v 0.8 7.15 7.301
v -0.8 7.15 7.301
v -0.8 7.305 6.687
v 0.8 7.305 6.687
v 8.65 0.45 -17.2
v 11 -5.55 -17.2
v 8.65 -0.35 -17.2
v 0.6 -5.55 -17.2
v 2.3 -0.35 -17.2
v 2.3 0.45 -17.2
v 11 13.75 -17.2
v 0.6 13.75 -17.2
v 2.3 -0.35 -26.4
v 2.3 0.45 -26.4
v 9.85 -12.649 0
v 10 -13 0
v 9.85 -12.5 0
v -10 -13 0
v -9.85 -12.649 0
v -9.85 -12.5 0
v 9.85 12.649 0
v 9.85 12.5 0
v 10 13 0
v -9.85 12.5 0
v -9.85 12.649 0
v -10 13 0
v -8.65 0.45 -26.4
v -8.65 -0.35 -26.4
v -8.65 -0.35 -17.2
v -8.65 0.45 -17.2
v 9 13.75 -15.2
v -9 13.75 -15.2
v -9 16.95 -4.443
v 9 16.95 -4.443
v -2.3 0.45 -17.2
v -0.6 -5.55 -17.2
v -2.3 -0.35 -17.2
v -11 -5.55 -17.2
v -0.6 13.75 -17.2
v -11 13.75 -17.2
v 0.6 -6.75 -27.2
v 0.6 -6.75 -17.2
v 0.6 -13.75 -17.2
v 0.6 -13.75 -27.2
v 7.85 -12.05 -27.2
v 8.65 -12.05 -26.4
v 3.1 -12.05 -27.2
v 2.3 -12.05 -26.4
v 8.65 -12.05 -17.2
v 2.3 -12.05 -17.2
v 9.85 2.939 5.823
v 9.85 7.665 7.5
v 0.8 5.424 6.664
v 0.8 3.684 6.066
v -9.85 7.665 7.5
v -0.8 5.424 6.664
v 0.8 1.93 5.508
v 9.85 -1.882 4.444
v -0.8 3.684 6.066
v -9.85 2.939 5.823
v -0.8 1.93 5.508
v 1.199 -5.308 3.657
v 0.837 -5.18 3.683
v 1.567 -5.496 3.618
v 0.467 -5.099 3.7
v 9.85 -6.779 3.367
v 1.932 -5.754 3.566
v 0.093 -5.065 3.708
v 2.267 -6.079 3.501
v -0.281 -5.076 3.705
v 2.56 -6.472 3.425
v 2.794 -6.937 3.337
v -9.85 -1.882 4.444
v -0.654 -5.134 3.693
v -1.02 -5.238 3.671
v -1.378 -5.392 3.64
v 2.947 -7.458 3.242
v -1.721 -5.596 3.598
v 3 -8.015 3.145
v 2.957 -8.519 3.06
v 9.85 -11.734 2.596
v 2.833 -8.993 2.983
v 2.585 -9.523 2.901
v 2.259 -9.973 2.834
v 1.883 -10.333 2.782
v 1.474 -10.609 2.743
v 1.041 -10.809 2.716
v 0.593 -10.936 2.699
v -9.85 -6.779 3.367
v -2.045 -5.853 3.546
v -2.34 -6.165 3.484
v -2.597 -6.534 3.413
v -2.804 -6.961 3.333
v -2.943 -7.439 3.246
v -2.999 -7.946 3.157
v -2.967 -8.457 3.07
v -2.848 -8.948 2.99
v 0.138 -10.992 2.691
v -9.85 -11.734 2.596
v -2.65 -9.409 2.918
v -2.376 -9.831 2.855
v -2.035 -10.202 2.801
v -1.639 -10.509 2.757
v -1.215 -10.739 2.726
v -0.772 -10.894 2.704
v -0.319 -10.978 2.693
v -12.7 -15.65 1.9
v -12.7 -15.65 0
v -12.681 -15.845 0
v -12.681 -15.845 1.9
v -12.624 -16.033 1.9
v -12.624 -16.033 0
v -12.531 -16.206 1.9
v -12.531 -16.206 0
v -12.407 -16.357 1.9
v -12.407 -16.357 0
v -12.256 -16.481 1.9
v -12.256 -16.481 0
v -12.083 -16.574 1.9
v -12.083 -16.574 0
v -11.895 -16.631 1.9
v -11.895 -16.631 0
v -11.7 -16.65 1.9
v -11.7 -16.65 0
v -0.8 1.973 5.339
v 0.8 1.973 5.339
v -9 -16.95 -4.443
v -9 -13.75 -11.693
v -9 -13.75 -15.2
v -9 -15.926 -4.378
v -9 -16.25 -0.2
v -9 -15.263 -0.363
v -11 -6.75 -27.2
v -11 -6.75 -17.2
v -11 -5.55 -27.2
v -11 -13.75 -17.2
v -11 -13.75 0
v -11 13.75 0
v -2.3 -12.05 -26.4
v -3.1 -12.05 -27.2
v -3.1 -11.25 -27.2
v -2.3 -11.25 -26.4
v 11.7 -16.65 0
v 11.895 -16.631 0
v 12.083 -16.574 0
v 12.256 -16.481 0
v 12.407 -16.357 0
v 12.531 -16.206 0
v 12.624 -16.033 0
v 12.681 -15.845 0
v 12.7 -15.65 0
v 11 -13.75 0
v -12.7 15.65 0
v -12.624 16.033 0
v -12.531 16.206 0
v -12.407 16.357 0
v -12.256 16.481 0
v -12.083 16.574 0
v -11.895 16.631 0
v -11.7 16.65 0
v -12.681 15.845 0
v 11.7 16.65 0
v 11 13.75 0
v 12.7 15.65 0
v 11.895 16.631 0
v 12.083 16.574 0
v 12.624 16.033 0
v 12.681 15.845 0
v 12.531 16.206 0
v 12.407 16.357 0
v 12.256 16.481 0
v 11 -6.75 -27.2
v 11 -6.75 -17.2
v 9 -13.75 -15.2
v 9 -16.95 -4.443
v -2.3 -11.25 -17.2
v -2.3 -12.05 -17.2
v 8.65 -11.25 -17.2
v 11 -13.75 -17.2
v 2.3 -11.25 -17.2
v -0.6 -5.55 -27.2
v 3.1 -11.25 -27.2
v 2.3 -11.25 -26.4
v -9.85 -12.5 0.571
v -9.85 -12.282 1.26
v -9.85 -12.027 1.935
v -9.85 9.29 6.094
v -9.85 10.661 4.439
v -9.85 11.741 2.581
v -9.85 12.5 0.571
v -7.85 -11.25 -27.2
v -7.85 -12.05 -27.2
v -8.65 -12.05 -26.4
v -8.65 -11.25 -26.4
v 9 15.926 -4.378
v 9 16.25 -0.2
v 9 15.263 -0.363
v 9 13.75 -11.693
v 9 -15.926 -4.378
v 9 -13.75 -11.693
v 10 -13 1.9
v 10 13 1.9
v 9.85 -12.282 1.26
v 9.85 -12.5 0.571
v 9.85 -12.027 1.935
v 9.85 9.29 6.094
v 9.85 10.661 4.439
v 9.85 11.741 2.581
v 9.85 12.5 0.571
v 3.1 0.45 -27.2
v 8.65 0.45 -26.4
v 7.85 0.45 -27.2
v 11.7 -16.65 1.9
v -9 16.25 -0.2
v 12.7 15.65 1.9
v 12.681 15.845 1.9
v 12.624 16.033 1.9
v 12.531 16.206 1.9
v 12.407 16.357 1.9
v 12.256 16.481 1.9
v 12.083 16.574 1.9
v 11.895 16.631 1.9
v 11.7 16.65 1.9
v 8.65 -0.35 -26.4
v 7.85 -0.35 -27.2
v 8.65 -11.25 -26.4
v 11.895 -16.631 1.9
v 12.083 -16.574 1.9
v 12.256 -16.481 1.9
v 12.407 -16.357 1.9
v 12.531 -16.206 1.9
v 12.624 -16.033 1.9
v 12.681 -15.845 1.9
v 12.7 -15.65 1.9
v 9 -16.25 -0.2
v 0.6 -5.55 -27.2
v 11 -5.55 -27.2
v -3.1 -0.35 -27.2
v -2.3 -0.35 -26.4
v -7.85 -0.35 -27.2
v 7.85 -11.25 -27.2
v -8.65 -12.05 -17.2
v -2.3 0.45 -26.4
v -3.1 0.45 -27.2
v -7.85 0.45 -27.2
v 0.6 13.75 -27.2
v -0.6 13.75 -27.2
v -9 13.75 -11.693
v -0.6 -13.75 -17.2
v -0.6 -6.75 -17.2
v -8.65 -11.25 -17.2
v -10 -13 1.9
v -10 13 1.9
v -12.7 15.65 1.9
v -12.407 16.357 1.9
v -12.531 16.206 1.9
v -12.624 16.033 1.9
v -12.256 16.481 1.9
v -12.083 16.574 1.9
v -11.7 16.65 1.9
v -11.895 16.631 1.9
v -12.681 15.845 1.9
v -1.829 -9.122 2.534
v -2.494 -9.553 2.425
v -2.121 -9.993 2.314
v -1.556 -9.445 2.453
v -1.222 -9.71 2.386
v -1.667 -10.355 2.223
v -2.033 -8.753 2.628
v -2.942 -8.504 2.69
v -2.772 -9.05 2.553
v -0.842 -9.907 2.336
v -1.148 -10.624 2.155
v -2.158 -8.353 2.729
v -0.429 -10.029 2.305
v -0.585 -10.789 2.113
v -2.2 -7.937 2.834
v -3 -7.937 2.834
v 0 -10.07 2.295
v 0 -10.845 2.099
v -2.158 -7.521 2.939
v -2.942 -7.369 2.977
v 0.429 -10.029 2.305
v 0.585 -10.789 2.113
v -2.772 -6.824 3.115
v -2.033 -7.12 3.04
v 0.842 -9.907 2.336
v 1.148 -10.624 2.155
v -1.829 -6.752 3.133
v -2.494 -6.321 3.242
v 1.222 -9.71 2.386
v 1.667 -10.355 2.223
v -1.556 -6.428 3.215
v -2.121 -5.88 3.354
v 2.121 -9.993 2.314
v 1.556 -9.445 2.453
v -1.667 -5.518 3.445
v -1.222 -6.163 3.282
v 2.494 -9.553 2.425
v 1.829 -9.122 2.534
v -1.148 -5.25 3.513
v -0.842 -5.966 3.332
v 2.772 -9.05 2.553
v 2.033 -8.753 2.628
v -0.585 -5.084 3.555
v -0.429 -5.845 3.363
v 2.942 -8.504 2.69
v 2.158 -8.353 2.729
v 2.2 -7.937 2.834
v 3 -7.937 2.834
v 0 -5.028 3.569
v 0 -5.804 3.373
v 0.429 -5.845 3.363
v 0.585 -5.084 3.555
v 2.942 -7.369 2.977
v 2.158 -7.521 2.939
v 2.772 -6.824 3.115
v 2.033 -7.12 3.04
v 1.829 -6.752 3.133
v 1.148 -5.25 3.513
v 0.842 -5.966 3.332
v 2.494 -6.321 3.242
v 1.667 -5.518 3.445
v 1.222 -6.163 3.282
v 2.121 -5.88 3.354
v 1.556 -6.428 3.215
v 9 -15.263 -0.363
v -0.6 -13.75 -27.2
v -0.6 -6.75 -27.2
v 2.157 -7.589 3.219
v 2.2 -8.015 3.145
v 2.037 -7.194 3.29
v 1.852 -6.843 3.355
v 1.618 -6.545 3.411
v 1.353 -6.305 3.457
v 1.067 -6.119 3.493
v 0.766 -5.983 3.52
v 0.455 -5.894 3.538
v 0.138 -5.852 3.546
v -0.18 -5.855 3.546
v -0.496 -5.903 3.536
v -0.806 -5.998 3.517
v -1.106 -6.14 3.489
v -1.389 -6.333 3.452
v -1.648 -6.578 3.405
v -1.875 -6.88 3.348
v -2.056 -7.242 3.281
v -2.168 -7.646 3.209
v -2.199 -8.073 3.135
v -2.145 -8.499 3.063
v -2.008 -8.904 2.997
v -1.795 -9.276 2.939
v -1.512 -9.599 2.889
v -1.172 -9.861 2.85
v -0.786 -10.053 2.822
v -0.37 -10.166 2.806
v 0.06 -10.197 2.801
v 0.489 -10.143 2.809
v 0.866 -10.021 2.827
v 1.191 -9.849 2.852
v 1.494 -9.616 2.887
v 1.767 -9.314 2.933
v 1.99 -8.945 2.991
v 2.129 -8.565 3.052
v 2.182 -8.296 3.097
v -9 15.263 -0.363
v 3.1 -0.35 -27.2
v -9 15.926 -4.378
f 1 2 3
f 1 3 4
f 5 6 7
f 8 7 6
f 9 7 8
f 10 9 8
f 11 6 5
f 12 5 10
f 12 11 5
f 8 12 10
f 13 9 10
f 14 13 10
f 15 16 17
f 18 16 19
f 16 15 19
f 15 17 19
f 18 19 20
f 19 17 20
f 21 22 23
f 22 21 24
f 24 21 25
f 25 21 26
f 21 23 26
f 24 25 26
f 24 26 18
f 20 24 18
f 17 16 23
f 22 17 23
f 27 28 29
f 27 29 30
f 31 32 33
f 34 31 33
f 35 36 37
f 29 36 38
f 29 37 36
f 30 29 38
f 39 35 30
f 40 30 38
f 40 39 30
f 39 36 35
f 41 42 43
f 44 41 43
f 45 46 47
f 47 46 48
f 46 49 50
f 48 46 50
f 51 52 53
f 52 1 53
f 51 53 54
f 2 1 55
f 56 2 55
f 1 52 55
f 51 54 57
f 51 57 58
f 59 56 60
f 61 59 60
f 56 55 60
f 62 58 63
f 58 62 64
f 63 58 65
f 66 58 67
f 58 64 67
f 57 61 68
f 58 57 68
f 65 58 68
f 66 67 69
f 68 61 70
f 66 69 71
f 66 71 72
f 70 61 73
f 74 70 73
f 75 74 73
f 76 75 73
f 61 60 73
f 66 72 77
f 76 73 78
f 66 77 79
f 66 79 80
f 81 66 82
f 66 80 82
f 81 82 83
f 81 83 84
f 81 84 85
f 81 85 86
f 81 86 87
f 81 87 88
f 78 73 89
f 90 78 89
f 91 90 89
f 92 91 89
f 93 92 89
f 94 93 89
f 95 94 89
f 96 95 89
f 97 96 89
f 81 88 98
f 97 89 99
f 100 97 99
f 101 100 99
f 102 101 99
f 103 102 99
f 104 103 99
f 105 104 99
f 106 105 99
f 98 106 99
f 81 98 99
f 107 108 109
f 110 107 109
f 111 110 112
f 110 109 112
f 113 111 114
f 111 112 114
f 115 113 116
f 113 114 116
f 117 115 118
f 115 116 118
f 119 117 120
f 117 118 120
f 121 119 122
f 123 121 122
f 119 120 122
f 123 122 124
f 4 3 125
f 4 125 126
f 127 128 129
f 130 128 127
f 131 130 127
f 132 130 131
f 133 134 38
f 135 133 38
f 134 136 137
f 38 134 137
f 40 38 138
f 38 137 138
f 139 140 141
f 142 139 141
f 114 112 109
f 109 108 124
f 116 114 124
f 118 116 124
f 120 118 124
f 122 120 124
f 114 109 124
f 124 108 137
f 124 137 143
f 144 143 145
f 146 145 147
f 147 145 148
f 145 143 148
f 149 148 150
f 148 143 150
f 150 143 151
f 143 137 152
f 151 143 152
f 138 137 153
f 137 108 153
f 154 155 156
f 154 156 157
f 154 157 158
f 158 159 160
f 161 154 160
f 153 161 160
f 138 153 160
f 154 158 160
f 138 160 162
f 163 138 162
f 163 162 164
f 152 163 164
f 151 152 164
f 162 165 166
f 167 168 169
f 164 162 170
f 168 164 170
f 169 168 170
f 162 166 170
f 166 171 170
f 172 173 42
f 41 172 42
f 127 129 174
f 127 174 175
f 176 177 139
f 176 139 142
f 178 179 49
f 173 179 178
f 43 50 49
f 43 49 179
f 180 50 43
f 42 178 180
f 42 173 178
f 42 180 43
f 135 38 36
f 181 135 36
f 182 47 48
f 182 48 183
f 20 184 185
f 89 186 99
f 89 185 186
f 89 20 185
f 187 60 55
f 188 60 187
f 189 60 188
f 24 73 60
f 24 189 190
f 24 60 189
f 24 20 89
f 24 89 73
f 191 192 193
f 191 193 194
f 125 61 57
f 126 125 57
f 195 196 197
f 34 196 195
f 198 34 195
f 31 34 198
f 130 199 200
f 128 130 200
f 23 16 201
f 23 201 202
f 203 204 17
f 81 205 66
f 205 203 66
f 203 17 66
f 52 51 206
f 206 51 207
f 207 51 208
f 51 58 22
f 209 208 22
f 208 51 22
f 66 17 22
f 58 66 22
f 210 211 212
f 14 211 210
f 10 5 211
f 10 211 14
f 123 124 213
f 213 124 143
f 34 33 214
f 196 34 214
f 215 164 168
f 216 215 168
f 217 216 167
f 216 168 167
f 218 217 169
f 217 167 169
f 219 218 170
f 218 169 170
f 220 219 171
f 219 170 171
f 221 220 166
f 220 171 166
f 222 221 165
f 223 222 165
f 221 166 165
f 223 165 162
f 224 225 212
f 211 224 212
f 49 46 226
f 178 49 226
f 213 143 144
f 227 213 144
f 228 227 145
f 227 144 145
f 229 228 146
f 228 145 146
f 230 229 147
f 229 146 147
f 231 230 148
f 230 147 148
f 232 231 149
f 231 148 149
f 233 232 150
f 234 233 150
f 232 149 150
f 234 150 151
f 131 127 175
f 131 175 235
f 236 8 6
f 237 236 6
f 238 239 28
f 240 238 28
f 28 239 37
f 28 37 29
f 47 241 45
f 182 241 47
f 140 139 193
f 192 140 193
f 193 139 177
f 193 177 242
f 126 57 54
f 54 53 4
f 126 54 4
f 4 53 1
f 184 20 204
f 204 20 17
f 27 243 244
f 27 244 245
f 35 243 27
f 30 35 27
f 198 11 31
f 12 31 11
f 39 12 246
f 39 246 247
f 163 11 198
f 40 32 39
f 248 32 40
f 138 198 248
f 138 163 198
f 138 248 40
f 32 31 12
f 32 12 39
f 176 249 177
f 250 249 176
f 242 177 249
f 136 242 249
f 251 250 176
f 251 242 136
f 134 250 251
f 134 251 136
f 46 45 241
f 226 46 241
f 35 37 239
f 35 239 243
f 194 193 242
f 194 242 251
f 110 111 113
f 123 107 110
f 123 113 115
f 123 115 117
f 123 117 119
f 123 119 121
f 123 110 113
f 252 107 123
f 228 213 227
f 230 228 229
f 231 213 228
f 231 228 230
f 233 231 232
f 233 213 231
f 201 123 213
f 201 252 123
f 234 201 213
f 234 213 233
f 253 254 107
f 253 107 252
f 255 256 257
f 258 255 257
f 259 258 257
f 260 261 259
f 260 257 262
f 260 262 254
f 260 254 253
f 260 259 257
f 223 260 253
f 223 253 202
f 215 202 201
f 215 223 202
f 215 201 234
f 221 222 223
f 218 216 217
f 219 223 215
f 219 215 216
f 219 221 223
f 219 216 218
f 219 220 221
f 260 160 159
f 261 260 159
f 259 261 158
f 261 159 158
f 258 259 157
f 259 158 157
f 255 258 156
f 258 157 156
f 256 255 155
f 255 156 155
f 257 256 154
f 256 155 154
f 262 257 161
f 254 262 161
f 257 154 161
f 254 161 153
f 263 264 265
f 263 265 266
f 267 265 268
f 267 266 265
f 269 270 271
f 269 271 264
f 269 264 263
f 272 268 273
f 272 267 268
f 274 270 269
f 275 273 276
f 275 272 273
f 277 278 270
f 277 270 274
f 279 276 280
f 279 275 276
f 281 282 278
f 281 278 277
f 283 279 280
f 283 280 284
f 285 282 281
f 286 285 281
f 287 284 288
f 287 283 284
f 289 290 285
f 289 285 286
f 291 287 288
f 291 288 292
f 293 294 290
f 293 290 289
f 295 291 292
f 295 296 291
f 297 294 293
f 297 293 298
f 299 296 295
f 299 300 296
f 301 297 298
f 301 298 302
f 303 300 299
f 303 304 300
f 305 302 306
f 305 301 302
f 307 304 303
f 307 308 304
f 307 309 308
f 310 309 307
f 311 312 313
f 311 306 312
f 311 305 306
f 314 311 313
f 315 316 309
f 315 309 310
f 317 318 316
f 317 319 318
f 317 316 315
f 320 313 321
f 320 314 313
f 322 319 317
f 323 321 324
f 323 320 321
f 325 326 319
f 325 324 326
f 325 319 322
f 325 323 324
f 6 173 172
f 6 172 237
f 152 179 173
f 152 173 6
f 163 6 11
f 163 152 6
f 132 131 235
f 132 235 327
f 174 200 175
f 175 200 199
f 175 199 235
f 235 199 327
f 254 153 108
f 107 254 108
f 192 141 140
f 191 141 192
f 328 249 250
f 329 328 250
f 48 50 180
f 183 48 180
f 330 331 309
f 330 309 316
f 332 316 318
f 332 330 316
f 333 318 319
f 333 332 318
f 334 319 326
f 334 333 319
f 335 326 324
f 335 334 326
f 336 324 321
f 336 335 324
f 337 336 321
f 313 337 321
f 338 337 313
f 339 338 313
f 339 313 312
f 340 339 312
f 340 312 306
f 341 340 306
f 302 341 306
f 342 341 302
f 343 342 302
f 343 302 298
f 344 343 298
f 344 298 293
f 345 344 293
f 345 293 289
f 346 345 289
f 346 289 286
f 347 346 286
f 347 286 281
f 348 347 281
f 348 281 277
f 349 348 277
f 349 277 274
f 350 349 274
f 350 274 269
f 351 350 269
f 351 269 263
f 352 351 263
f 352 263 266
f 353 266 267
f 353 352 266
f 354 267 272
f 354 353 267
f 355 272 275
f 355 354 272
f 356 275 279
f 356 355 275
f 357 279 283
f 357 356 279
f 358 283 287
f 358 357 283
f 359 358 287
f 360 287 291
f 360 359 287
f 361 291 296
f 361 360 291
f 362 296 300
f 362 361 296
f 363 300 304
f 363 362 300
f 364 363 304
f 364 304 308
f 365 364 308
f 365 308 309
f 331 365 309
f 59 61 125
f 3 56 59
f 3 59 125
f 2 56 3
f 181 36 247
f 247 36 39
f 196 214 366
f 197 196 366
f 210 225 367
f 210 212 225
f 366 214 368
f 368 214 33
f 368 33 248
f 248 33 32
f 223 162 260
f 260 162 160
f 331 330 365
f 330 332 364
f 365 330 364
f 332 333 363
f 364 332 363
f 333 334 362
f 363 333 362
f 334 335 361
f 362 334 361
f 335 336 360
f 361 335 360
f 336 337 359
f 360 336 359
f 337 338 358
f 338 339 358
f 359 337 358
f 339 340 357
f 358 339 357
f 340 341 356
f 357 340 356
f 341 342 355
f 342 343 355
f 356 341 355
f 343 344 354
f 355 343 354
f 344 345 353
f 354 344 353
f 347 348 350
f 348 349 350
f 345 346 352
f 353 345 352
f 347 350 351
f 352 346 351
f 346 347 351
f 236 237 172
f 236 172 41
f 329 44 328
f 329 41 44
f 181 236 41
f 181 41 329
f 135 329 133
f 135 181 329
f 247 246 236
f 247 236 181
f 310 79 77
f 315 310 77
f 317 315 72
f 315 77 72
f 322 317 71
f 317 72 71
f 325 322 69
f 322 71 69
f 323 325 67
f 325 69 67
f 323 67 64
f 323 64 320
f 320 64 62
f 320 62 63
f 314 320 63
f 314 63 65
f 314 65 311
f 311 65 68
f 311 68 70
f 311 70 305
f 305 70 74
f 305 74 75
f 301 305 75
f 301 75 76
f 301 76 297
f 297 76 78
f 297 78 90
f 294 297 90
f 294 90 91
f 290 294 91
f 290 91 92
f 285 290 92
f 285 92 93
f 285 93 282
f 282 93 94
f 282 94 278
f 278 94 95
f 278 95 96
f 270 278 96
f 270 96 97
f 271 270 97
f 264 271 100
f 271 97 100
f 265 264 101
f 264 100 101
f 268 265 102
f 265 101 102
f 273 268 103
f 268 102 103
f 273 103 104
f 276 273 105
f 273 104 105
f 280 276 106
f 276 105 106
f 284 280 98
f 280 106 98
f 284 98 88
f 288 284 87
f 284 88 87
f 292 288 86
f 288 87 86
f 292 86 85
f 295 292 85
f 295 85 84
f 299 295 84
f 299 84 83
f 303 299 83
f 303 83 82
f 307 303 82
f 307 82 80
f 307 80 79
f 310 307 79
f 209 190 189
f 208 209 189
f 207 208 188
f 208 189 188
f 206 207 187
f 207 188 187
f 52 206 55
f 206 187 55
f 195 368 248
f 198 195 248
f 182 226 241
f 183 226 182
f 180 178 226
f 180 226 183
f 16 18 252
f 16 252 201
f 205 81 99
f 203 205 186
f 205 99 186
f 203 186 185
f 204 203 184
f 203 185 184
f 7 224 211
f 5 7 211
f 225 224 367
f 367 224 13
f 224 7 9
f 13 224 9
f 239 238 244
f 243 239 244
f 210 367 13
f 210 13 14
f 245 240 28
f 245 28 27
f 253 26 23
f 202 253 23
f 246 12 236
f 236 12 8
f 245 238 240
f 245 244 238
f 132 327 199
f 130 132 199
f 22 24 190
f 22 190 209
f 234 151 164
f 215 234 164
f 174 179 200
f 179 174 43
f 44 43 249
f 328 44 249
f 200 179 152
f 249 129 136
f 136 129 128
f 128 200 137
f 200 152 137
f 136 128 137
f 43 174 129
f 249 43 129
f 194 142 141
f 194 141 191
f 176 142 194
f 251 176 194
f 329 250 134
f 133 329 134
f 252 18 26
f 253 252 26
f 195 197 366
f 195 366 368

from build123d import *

# Parameters (mm, degrees)
SKETCH1_W           = 20
SKETCH1_H           = 26
EXTRUDE1_DEPTH      = 1.9
SKETCH2_W           = 22
SKETCH2_H           = 27.5
EXTRUDE2_DEPTH      = 17.2
SKETCH3_W           = 19.7
SKETCH3_H           = 25
EXTRUDE3_DEPTH      = 7.6
CUT_EXTRUDE1_DEPTH  = 19.7
SKETCH5_R           = 3
SKETCH5_R_2         = 2.2
SKETCH5_W           = 1.6
SKETCH5_H           = 5.5
CUT_EXTRUDE2_DEPTH  = 0.7
SKETCH6_R           = 80.623139619
CUT_EXTRUDE3_DEPTH  = 23.55
SKETCH7_W           = 6.35
SKETCH7_H           = 0.8
EXTRUDE4_DEPTH      = 10
CHAMFER1_SIZE       = 0.8
EXTRUDE5_DEPTH      = 9
EXTRUDE5_DEPTH_BACK = 9


with BuildPart() as part:
    # Sketch1 → Extrude1 (new body)
    with BuildSketch(Plane.XY):
        with BuildLine():
            Line((-11.7, -16.65), (11.7, -16.65))
            ThreePointArc((11.7, -16.65), (12.407106781, -16.357106781), (12.7, -15.65))
            Line((12.7, -15.65), (12.7, 15.65))
            ThreePointArc((12.7, 15.65), (12.407106781, 16.357106781), (11.7, 16.65))
            Line((11.7, 16.65), (-11.7, 16.65))
            ThreePointArc((-11.7, 16.65), (-12.407106781, 16.357106781), (-12.7, 15.65))
            Line((-12.7, 15.65), (-12.7, -15.65))
            ThreePointArc((-12.7, -15.65), (-12.407106781, -16.357106781), (-11.7, -16.65))
        make_face()
        Rectangle(SKETCH1_W, SKETCH1_H, mode=Mode.SUBTRACT)
    extrude(amount=EXTRUDE1_DEPTH)

    # Sketch2 → Extrude2 (add)
    with BuildSketch(Plane(origin=(0, 0, 0), x_dir=(-1, 0, 0), z_dir=(0, 0, -1))):
        Rectangle(SKETCH2_W, SKETCH2_H)
    extrude(amount=EXTRUDE2_DEPTH)

    # Sketch3 → Extrude3 (add)
    with BuildSketch(Plane.XY):
        Rectangle(SKETCH3_W, SKETCH3_H)
    extrude(amount=EXTRUDE3_DEPTH)

    # Sketch4 → Cut-Extrude1 (cut)
    with BuildSketch(Plane.ZY.offset(9.85)):
        with BuildLine():
            Line((0, -12.649110641), (10.2, -12.649110641))
            Line((10.2, -12.649110641), (10.2, 12.649110641))
            Line((10.2, 12.649110641), (0, 12.649110641))
            ThreePointArc((0, 12.649110641), (4.195359715, 10.827132519), (7.5, 7.664854858))
            Line((7.5, 7.664854858), (2.595963169, -11.733933535))
            ThreePointArc((2.595963169, -11.733933535), (1.322271739, -12.260422791), (0, -12.649110641))
        make_face()
    extrude(amount=-CUT_EXTRUDE1_DEPTH, mode=Mode.SUBTRACT)

    # Sketch5 → Cut-Extrude2 (cut)
    with BuildSketch(Plane(origin=(0, -1.321692682, 5.228190069), x_dir=(1, 0, 0), z_dir=(0, -0.245090789, 0.969500132))):
        with Locations((0, -7)):
            Circle(SKETCH5_R)
        with Locations((0, -7)):
            Circle(SKETCH5_R_2, mode=Mode.SUBTRACT)
        with Locations((0, 5.971443692)):
            Rectangle(SKETCH5_W, SKETCH5_H)
    extrude(amount=-CUT_EXTRUDE2_DEPTH, mode=Mode.SUBTRACT)

    # Sketch6 → Cut-Extrude3 (cut, through all)
    with BuildSketch(Plane.ZY.offset(9.85)):
        with Locations((82.607992112, -21.641802457)):
            Circle(SKETCH6_R)
    extrude(amount=-CUT_EXTRUDE3_DEPTH, mode=Mode.SUBTRACT)

    # Sketch7 → Extrude4 (add)
    with BuildSketch(Plane(origin=(0, 0, -17.2), x_dir=(-1, 0, 0), z_dir=(0, 0, -1))):
        Polygon((-0.6, -13.75), (0.6, -13.75), (0.6, -6.75), (11, -6.75), (11, -5.55), (0.6, -5.55), (0.6, 13.75), (-0.6, 13.75), (-0.6, -5.55), (-11, -5.55), (-11, -6.75), (-0.6, -6.75), align=None)
        with Locations((-5.475, 0.05)):
            Rectangle(SKETCH7_W, SKETCH7_H)
        with Locations((5.475, 0.05)):
            Rectangle(SKETCH7_W, SKETCH7_H)
        with Locations((-5.475, -11.65)):
            Rectangle(SKETCH7_W, SKETCH7_H)
        with Locations((5.475, -11.65)):
            Rectangle(SKETCH7_W, SKETCH7_H)
    extrude(amount=EXTRUDE4_DEPTH)

    # Chamfer1
    chamfer1_edges = [part.edges().sort_by_distance(p)[0] for p in [
        (8.65, 0.05, -27.2),
        (2.3, 0.05, -27.2),
        (-2.3, 0.05, -27.2),
        (-8.65, 0.05, -27.2),
        (8.65, -11.65, -27.2),
        (2.3, -11.65, -27.2),
        (-2.3, -11.65, -27.2),
        (-8.65, -11.65, -27.2),
    ]]
    chamfer(chamfer1_edges, length=CHAMFER1_SIZE)

    # Sketch8 → Extrude5 (add, two sides)
    with BuildSketch(Plane(origin=(0, 0, 0), x_dir=(0, 0, -1), z_dir=(1, 0, 0))) as extrude5_sk:
        Polygon((15.2, 13.75), (4.442640687, 16.95), (0.2, 16.25), (0.362790698, 15.263339375), (4.378231172, 15.925853253), (14.914876963, 12.791509075), align=None)
        Polygon((15.2, -13.75), (4.442640687, -16.95), (0.2, -16.25), (0.362790698, -15.263339375), (4.378231172, -15.925853253), (14.914876963, -12.791509075), align=None)
    extrude(amount=EXTRUDE5_DEPTH)
    extrude(extrude5_sk.sketch, amount=-EXTRUDE5_DEPTH_BACK)


solid = part.part
